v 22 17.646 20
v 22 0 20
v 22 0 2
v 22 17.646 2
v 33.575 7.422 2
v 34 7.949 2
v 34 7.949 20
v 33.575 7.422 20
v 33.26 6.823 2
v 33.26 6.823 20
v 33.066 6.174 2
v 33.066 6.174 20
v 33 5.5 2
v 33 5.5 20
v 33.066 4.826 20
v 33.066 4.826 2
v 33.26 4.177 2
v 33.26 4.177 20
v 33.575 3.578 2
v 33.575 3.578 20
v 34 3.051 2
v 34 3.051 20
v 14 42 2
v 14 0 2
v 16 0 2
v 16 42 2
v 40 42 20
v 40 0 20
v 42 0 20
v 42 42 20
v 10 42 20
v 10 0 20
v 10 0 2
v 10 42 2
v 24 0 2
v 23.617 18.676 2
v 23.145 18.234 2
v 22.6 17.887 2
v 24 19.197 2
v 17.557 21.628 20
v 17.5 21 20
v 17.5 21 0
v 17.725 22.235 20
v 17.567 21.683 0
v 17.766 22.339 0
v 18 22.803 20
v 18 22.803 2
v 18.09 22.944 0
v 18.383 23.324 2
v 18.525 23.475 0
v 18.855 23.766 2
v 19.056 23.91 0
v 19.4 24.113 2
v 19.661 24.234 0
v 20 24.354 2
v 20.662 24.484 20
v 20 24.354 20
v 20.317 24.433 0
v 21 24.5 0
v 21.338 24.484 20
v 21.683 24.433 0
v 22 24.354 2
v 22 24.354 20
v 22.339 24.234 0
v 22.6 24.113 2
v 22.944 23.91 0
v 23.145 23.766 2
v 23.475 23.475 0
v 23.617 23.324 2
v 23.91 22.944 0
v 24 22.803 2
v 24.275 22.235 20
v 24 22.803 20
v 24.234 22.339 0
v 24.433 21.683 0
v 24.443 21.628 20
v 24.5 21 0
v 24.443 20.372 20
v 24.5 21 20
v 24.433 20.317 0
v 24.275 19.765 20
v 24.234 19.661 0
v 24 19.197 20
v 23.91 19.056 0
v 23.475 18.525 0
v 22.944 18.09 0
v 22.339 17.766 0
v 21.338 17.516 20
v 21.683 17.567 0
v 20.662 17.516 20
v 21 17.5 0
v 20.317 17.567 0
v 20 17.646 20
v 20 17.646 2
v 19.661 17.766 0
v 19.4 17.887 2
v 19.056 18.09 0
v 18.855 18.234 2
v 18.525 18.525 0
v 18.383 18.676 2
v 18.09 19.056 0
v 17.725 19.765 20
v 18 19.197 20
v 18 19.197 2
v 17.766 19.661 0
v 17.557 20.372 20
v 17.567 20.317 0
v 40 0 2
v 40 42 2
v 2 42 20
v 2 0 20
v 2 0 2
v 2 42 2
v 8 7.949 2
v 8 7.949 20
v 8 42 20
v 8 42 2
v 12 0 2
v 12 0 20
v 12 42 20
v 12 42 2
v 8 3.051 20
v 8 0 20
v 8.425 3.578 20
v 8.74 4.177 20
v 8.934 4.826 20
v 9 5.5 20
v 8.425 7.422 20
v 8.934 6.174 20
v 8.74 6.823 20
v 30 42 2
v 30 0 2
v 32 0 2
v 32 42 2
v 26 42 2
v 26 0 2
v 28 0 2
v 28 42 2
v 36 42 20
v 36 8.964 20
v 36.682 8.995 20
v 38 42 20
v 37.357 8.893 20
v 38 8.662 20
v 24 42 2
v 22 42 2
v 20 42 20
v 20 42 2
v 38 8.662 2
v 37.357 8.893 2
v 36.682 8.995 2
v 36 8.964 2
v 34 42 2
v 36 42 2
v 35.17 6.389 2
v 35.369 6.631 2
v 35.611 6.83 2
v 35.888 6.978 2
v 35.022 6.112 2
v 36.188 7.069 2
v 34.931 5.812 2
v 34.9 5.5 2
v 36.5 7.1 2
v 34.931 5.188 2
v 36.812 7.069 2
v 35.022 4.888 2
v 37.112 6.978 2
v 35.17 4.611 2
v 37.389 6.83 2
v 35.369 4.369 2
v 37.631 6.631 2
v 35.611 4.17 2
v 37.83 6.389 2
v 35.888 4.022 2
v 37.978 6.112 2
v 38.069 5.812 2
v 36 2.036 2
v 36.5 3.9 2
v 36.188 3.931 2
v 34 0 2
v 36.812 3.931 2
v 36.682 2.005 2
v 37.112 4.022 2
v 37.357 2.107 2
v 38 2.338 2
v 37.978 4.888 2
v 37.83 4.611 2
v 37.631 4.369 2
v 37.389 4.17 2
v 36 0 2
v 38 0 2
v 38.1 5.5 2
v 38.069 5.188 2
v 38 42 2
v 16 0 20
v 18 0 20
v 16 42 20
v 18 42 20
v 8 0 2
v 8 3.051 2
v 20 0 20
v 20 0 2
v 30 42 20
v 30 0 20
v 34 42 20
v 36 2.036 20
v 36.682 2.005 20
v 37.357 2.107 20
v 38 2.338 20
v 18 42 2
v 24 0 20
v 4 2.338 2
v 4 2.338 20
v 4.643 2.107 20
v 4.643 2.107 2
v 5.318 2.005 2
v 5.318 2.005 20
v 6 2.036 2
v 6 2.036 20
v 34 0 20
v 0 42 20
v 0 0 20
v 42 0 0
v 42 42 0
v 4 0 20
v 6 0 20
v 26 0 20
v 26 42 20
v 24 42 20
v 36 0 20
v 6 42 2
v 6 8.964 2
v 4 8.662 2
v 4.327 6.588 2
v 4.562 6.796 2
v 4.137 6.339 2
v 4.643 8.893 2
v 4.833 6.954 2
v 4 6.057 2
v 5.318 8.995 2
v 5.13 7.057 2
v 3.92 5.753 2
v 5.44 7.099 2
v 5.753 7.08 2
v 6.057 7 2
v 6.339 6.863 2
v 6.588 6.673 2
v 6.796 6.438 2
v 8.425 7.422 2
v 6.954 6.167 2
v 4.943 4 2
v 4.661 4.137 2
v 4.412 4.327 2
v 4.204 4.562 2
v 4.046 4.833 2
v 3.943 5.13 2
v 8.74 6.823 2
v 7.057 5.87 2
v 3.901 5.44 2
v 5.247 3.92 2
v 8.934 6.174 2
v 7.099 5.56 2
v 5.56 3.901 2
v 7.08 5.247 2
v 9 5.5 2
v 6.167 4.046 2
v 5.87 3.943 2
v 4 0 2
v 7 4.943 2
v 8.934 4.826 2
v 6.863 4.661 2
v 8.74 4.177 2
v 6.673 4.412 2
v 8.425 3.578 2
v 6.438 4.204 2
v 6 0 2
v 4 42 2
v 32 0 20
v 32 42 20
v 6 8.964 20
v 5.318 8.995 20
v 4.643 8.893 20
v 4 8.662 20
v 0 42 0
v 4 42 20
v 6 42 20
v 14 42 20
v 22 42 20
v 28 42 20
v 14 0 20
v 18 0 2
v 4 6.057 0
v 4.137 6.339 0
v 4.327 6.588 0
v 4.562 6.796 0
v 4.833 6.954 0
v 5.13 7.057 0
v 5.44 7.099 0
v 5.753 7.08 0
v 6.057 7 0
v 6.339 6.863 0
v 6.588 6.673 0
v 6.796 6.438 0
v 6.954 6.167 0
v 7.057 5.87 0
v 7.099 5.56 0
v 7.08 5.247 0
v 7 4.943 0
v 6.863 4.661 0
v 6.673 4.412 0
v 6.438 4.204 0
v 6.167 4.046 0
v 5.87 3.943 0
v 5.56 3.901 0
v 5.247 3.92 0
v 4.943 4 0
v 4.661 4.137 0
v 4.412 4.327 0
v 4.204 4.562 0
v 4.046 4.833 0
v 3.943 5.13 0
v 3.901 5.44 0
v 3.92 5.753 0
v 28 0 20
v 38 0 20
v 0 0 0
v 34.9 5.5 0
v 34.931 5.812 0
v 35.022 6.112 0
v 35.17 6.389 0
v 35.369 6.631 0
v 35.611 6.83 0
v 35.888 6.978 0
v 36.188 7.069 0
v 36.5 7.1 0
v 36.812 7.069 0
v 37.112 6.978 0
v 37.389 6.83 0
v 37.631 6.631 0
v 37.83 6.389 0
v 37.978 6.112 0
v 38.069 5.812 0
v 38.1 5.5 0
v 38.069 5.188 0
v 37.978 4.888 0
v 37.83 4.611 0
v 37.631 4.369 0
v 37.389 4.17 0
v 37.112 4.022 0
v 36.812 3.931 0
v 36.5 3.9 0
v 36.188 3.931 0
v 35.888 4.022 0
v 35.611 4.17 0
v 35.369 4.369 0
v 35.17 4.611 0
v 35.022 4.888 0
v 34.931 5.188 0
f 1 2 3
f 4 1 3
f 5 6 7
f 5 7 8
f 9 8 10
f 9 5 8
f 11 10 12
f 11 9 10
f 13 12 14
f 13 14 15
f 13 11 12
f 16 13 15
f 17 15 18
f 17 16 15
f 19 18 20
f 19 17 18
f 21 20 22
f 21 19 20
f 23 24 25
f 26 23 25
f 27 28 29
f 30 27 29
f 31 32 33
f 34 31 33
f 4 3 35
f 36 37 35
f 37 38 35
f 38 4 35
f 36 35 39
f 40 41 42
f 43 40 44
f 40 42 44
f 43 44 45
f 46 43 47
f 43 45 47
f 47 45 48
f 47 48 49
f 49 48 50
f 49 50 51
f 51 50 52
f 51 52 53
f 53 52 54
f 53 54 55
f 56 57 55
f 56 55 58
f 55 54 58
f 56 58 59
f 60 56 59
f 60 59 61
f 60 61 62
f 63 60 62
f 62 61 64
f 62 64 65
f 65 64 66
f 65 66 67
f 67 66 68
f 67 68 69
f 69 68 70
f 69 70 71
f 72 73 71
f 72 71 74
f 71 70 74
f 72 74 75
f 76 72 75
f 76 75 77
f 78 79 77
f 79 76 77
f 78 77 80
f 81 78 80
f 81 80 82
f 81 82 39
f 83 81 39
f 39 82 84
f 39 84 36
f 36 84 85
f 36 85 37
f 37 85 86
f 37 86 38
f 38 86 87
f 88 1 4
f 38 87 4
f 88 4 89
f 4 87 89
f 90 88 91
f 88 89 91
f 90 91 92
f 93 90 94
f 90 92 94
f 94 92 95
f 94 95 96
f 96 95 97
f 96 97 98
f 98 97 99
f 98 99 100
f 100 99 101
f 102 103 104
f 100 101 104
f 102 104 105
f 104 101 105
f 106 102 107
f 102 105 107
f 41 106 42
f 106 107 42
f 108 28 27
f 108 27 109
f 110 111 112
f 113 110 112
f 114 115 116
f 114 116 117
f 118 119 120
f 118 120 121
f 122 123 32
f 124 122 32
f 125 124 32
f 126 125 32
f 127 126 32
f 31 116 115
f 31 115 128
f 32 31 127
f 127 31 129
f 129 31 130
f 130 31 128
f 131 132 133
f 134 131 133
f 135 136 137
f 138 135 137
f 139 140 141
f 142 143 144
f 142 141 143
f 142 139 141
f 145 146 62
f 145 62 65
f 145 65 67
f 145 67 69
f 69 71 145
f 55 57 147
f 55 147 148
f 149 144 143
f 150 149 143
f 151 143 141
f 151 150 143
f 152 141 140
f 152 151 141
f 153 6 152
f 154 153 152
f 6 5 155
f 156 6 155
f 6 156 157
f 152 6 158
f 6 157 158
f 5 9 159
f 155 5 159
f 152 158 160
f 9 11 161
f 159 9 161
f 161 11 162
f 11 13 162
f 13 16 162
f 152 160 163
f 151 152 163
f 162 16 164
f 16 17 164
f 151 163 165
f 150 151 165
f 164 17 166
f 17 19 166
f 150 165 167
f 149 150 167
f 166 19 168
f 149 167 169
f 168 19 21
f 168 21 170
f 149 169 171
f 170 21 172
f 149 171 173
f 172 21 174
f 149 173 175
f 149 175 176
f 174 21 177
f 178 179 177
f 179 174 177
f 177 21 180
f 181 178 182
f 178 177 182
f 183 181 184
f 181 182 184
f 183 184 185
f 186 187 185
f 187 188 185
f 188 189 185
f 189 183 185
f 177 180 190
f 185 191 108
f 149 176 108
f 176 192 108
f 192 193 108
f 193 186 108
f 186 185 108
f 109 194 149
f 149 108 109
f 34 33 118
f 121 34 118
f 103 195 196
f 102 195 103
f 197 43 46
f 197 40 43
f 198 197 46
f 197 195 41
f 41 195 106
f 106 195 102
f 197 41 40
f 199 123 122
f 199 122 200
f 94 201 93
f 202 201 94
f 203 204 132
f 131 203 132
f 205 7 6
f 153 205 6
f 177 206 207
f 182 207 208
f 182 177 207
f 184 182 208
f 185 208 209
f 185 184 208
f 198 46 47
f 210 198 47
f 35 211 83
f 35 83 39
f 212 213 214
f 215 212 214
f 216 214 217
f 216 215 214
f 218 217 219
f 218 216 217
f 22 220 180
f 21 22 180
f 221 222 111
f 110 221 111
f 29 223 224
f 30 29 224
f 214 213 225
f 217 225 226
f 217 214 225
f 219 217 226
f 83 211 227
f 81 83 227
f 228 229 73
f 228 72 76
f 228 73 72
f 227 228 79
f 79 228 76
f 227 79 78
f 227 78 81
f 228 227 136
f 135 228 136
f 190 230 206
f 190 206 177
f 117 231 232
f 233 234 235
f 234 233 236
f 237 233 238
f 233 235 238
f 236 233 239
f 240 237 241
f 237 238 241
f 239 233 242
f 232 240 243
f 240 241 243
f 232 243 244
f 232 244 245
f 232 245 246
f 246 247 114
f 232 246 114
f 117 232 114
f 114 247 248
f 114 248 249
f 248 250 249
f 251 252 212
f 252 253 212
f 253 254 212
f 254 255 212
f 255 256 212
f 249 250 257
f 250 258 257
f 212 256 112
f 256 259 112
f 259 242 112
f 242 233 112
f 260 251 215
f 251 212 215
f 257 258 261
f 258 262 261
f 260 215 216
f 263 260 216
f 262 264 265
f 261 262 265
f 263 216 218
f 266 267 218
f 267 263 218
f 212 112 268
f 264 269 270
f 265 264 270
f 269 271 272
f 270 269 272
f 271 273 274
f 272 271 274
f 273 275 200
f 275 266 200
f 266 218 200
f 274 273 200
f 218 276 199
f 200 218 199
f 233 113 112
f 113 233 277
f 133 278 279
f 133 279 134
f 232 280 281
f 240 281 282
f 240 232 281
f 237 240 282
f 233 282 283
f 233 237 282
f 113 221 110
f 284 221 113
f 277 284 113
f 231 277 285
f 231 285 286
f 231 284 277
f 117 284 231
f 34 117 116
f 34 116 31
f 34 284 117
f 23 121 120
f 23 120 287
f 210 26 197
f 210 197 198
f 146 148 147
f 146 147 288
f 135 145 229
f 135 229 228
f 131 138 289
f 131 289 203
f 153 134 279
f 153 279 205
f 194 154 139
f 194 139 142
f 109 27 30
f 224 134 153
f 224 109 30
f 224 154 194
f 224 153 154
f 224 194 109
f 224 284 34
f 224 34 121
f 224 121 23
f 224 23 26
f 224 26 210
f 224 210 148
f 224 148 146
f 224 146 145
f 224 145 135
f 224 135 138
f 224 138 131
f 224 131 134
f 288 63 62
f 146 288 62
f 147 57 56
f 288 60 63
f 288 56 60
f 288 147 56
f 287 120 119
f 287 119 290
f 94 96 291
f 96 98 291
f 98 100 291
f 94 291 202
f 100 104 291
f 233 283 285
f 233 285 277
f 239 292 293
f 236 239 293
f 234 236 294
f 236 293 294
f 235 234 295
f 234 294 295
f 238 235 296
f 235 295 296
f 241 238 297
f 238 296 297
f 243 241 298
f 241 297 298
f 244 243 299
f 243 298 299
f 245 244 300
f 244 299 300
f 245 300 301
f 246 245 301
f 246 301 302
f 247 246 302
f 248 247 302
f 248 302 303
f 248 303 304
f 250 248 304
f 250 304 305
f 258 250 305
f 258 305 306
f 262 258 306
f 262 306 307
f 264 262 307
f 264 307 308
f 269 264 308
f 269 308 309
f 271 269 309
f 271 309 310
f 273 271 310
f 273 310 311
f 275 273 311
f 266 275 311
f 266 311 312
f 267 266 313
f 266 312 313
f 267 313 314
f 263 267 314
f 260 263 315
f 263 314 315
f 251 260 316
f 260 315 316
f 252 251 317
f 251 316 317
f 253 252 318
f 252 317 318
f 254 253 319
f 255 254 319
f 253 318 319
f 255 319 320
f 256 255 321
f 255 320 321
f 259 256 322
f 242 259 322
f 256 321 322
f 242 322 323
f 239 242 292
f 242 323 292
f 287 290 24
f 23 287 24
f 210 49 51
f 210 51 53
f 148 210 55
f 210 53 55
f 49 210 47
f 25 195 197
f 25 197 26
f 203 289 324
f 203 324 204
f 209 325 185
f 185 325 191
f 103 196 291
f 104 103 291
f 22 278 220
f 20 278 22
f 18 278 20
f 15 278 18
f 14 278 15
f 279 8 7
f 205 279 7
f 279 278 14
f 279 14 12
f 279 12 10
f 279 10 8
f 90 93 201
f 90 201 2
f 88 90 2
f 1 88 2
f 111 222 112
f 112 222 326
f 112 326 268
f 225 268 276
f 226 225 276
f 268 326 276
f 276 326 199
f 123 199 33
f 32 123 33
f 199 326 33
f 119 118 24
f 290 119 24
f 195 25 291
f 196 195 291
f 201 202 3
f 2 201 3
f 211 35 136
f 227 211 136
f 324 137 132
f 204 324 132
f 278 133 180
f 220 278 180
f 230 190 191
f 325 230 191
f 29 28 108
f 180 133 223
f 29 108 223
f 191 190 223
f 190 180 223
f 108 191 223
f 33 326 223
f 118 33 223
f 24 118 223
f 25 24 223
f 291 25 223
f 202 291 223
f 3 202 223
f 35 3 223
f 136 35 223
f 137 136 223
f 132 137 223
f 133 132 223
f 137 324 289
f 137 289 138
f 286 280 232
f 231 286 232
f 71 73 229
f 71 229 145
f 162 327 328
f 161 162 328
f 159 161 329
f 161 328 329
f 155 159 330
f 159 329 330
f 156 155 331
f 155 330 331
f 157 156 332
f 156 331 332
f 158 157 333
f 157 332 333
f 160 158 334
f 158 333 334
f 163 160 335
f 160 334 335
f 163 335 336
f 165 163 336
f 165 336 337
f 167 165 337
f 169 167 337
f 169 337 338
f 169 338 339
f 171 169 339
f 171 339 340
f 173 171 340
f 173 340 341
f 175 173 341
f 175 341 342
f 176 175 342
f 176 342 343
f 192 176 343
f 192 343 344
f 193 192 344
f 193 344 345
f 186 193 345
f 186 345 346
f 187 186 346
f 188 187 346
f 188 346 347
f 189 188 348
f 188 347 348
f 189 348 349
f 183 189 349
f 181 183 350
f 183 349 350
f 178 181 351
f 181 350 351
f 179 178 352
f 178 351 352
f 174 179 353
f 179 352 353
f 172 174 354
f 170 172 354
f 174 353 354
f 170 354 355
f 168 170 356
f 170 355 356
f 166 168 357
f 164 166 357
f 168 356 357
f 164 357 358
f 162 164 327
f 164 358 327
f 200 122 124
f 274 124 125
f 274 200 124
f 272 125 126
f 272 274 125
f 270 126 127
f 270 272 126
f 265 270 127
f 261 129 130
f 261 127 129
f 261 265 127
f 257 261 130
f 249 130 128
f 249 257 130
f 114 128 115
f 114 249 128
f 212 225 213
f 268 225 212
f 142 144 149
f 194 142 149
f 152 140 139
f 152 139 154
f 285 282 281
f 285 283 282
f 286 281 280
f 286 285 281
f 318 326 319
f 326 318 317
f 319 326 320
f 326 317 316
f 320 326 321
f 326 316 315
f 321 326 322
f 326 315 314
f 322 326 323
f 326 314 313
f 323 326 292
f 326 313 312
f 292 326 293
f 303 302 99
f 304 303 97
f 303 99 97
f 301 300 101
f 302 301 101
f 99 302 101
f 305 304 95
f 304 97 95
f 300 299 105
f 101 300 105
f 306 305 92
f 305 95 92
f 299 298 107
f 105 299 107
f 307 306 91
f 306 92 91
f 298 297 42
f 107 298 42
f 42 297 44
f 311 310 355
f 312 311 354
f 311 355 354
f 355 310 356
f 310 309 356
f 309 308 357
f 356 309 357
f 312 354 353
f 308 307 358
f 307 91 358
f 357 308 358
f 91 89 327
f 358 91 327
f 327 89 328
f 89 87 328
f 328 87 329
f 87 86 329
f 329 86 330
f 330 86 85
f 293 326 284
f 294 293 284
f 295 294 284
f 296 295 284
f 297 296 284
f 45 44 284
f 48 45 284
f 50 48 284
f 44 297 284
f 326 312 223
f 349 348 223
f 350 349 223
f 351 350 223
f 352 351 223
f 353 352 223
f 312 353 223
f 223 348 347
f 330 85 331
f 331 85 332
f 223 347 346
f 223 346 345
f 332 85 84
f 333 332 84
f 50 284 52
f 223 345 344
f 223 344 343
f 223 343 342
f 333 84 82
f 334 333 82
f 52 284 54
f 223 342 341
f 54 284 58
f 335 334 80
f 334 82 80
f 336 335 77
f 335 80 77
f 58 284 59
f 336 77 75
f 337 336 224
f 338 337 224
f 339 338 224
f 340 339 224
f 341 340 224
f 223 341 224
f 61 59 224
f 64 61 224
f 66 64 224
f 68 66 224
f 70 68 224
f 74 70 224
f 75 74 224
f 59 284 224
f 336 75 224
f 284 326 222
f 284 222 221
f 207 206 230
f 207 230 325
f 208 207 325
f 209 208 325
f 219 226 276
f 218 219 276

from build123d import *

# Parameters (mm, degrees)
SKETCH1_W               = 42
SKETCH1_H               = 42
BOSS_EXTRUDE1_DEPTH     = 20
CUT_EXTRUDE6_DEPTH      = 63.673758464
CUT_EXTRUDE6_DEPTH_BACK = 42
SKETCH7_W               = 2
SKETCH7_H               = 18
SKETCH8_R               = 1.6
SKETCH8_R_2             = 3.5
CUT_EXTRUDE7_DEPTH      = 2
CUT_EXTRUDE8_START      = -18
SKETCH10_R              = 3.5
CUT_EXTRUDE8_DEPTH      = 18


with BuildPart() as part:
    # Sketch1 → Boss-Extrude1 (new body)
    with BuildSketch(Plane.XY):
        with Locations((21, 21)):
            Rectangle(SKETCH1_W, SKETCH1_H)
    extrude(amount=BOSS_EXTRUDE1_DEPTH)

    # Sketch7 → Cut-Extrude6 (cut, two sides: drawn at the far end of the back side and taken through both)
    with BuildSketch(Plane(origin=(0, 42, 0), x_dir=(1, 0, 0), z_dir=(0, 1, 0)).offset(-CUT_EXTRUDE6_DEPTH_BACK)):
        with Locations((39, -11)):
            Rectangle(SKETCH7_W, SKETCH7_H)
        with Locations((35, -11)):
            Rectangle(SKETCH7_W, SKETCH7_H)
        with Locations((3, -11)):
            Rectangle(SKETCH7_W, SKETCH7_H)
        with Locations((31, -11)):
            Rectangle(SKETCH7_W, SKETCH7_H)
        with Locations((7, -11)):
            Rectangle(SKETCH7_W, SKETCH7_H)
        with Locations((27, -11)):
            Rectangle(SKETCH7_W, SKETCH7_H)
        with Locations((11, -11)):
            Rectangle(SKETCH7_W, SKETCH7_H)
        with Locations((23, -11)):
            Rectangle(SKETCH7_W, SKETCH7_H)
        with Locations((15, -11)):
            Rectangle(SKETCH7_W, SKETCH7_H)
        with Locations((19, -11)):
            Rectangle(SKETCH7_W, SKETCH7_H)
    extrude(amount=CUT_EXTRUDE6_DEPTH + CUT_EXTRUDE6_DEPTH_BACK, mode=Mode.SUBTRACT)

    # Sketch8 → Cut-Extrude7 (cut)
    with BuildSketch(Plane(origin=(0, 0, 0), x_dir=(-1, 0, 0), z_dir=(0, 0, -1))):
        with Locations((-36.5, 5.5)):
            Circle(SKETCH8_R)
        with Locations(Location((-5.5, 5.5, 0), (0, 0, 20.364134806))):
            Circle(SKETCH8_R)
        with Locations((-21, 21)):
            Circle(SKETCH8_R_2)
    extrude(amount=-CUT_EXTRUDE7_DEPTH, mode=Mode.SUBTRACT)

    # Sketch10 → Cut-Extrude8 (cut)
    with BuildSketch(Plane.XY.offset(20).offset(CUT_EXTRUDE8_START)):
        with Locations((36.5, 5.5)):
            Circle(SKETCH10_R)
        with Locations((5.5, 5.5)):
            Circle(SKETCH10_R)
        with Locations(Location((21, 21, 0), (0, 0, 180))):
            Circle(SKETCH10_R)
    extrude(amount=CUT_EXTRUDE8_DEPTH, mode=Mode.SUBTRACT)


solid = part.part
